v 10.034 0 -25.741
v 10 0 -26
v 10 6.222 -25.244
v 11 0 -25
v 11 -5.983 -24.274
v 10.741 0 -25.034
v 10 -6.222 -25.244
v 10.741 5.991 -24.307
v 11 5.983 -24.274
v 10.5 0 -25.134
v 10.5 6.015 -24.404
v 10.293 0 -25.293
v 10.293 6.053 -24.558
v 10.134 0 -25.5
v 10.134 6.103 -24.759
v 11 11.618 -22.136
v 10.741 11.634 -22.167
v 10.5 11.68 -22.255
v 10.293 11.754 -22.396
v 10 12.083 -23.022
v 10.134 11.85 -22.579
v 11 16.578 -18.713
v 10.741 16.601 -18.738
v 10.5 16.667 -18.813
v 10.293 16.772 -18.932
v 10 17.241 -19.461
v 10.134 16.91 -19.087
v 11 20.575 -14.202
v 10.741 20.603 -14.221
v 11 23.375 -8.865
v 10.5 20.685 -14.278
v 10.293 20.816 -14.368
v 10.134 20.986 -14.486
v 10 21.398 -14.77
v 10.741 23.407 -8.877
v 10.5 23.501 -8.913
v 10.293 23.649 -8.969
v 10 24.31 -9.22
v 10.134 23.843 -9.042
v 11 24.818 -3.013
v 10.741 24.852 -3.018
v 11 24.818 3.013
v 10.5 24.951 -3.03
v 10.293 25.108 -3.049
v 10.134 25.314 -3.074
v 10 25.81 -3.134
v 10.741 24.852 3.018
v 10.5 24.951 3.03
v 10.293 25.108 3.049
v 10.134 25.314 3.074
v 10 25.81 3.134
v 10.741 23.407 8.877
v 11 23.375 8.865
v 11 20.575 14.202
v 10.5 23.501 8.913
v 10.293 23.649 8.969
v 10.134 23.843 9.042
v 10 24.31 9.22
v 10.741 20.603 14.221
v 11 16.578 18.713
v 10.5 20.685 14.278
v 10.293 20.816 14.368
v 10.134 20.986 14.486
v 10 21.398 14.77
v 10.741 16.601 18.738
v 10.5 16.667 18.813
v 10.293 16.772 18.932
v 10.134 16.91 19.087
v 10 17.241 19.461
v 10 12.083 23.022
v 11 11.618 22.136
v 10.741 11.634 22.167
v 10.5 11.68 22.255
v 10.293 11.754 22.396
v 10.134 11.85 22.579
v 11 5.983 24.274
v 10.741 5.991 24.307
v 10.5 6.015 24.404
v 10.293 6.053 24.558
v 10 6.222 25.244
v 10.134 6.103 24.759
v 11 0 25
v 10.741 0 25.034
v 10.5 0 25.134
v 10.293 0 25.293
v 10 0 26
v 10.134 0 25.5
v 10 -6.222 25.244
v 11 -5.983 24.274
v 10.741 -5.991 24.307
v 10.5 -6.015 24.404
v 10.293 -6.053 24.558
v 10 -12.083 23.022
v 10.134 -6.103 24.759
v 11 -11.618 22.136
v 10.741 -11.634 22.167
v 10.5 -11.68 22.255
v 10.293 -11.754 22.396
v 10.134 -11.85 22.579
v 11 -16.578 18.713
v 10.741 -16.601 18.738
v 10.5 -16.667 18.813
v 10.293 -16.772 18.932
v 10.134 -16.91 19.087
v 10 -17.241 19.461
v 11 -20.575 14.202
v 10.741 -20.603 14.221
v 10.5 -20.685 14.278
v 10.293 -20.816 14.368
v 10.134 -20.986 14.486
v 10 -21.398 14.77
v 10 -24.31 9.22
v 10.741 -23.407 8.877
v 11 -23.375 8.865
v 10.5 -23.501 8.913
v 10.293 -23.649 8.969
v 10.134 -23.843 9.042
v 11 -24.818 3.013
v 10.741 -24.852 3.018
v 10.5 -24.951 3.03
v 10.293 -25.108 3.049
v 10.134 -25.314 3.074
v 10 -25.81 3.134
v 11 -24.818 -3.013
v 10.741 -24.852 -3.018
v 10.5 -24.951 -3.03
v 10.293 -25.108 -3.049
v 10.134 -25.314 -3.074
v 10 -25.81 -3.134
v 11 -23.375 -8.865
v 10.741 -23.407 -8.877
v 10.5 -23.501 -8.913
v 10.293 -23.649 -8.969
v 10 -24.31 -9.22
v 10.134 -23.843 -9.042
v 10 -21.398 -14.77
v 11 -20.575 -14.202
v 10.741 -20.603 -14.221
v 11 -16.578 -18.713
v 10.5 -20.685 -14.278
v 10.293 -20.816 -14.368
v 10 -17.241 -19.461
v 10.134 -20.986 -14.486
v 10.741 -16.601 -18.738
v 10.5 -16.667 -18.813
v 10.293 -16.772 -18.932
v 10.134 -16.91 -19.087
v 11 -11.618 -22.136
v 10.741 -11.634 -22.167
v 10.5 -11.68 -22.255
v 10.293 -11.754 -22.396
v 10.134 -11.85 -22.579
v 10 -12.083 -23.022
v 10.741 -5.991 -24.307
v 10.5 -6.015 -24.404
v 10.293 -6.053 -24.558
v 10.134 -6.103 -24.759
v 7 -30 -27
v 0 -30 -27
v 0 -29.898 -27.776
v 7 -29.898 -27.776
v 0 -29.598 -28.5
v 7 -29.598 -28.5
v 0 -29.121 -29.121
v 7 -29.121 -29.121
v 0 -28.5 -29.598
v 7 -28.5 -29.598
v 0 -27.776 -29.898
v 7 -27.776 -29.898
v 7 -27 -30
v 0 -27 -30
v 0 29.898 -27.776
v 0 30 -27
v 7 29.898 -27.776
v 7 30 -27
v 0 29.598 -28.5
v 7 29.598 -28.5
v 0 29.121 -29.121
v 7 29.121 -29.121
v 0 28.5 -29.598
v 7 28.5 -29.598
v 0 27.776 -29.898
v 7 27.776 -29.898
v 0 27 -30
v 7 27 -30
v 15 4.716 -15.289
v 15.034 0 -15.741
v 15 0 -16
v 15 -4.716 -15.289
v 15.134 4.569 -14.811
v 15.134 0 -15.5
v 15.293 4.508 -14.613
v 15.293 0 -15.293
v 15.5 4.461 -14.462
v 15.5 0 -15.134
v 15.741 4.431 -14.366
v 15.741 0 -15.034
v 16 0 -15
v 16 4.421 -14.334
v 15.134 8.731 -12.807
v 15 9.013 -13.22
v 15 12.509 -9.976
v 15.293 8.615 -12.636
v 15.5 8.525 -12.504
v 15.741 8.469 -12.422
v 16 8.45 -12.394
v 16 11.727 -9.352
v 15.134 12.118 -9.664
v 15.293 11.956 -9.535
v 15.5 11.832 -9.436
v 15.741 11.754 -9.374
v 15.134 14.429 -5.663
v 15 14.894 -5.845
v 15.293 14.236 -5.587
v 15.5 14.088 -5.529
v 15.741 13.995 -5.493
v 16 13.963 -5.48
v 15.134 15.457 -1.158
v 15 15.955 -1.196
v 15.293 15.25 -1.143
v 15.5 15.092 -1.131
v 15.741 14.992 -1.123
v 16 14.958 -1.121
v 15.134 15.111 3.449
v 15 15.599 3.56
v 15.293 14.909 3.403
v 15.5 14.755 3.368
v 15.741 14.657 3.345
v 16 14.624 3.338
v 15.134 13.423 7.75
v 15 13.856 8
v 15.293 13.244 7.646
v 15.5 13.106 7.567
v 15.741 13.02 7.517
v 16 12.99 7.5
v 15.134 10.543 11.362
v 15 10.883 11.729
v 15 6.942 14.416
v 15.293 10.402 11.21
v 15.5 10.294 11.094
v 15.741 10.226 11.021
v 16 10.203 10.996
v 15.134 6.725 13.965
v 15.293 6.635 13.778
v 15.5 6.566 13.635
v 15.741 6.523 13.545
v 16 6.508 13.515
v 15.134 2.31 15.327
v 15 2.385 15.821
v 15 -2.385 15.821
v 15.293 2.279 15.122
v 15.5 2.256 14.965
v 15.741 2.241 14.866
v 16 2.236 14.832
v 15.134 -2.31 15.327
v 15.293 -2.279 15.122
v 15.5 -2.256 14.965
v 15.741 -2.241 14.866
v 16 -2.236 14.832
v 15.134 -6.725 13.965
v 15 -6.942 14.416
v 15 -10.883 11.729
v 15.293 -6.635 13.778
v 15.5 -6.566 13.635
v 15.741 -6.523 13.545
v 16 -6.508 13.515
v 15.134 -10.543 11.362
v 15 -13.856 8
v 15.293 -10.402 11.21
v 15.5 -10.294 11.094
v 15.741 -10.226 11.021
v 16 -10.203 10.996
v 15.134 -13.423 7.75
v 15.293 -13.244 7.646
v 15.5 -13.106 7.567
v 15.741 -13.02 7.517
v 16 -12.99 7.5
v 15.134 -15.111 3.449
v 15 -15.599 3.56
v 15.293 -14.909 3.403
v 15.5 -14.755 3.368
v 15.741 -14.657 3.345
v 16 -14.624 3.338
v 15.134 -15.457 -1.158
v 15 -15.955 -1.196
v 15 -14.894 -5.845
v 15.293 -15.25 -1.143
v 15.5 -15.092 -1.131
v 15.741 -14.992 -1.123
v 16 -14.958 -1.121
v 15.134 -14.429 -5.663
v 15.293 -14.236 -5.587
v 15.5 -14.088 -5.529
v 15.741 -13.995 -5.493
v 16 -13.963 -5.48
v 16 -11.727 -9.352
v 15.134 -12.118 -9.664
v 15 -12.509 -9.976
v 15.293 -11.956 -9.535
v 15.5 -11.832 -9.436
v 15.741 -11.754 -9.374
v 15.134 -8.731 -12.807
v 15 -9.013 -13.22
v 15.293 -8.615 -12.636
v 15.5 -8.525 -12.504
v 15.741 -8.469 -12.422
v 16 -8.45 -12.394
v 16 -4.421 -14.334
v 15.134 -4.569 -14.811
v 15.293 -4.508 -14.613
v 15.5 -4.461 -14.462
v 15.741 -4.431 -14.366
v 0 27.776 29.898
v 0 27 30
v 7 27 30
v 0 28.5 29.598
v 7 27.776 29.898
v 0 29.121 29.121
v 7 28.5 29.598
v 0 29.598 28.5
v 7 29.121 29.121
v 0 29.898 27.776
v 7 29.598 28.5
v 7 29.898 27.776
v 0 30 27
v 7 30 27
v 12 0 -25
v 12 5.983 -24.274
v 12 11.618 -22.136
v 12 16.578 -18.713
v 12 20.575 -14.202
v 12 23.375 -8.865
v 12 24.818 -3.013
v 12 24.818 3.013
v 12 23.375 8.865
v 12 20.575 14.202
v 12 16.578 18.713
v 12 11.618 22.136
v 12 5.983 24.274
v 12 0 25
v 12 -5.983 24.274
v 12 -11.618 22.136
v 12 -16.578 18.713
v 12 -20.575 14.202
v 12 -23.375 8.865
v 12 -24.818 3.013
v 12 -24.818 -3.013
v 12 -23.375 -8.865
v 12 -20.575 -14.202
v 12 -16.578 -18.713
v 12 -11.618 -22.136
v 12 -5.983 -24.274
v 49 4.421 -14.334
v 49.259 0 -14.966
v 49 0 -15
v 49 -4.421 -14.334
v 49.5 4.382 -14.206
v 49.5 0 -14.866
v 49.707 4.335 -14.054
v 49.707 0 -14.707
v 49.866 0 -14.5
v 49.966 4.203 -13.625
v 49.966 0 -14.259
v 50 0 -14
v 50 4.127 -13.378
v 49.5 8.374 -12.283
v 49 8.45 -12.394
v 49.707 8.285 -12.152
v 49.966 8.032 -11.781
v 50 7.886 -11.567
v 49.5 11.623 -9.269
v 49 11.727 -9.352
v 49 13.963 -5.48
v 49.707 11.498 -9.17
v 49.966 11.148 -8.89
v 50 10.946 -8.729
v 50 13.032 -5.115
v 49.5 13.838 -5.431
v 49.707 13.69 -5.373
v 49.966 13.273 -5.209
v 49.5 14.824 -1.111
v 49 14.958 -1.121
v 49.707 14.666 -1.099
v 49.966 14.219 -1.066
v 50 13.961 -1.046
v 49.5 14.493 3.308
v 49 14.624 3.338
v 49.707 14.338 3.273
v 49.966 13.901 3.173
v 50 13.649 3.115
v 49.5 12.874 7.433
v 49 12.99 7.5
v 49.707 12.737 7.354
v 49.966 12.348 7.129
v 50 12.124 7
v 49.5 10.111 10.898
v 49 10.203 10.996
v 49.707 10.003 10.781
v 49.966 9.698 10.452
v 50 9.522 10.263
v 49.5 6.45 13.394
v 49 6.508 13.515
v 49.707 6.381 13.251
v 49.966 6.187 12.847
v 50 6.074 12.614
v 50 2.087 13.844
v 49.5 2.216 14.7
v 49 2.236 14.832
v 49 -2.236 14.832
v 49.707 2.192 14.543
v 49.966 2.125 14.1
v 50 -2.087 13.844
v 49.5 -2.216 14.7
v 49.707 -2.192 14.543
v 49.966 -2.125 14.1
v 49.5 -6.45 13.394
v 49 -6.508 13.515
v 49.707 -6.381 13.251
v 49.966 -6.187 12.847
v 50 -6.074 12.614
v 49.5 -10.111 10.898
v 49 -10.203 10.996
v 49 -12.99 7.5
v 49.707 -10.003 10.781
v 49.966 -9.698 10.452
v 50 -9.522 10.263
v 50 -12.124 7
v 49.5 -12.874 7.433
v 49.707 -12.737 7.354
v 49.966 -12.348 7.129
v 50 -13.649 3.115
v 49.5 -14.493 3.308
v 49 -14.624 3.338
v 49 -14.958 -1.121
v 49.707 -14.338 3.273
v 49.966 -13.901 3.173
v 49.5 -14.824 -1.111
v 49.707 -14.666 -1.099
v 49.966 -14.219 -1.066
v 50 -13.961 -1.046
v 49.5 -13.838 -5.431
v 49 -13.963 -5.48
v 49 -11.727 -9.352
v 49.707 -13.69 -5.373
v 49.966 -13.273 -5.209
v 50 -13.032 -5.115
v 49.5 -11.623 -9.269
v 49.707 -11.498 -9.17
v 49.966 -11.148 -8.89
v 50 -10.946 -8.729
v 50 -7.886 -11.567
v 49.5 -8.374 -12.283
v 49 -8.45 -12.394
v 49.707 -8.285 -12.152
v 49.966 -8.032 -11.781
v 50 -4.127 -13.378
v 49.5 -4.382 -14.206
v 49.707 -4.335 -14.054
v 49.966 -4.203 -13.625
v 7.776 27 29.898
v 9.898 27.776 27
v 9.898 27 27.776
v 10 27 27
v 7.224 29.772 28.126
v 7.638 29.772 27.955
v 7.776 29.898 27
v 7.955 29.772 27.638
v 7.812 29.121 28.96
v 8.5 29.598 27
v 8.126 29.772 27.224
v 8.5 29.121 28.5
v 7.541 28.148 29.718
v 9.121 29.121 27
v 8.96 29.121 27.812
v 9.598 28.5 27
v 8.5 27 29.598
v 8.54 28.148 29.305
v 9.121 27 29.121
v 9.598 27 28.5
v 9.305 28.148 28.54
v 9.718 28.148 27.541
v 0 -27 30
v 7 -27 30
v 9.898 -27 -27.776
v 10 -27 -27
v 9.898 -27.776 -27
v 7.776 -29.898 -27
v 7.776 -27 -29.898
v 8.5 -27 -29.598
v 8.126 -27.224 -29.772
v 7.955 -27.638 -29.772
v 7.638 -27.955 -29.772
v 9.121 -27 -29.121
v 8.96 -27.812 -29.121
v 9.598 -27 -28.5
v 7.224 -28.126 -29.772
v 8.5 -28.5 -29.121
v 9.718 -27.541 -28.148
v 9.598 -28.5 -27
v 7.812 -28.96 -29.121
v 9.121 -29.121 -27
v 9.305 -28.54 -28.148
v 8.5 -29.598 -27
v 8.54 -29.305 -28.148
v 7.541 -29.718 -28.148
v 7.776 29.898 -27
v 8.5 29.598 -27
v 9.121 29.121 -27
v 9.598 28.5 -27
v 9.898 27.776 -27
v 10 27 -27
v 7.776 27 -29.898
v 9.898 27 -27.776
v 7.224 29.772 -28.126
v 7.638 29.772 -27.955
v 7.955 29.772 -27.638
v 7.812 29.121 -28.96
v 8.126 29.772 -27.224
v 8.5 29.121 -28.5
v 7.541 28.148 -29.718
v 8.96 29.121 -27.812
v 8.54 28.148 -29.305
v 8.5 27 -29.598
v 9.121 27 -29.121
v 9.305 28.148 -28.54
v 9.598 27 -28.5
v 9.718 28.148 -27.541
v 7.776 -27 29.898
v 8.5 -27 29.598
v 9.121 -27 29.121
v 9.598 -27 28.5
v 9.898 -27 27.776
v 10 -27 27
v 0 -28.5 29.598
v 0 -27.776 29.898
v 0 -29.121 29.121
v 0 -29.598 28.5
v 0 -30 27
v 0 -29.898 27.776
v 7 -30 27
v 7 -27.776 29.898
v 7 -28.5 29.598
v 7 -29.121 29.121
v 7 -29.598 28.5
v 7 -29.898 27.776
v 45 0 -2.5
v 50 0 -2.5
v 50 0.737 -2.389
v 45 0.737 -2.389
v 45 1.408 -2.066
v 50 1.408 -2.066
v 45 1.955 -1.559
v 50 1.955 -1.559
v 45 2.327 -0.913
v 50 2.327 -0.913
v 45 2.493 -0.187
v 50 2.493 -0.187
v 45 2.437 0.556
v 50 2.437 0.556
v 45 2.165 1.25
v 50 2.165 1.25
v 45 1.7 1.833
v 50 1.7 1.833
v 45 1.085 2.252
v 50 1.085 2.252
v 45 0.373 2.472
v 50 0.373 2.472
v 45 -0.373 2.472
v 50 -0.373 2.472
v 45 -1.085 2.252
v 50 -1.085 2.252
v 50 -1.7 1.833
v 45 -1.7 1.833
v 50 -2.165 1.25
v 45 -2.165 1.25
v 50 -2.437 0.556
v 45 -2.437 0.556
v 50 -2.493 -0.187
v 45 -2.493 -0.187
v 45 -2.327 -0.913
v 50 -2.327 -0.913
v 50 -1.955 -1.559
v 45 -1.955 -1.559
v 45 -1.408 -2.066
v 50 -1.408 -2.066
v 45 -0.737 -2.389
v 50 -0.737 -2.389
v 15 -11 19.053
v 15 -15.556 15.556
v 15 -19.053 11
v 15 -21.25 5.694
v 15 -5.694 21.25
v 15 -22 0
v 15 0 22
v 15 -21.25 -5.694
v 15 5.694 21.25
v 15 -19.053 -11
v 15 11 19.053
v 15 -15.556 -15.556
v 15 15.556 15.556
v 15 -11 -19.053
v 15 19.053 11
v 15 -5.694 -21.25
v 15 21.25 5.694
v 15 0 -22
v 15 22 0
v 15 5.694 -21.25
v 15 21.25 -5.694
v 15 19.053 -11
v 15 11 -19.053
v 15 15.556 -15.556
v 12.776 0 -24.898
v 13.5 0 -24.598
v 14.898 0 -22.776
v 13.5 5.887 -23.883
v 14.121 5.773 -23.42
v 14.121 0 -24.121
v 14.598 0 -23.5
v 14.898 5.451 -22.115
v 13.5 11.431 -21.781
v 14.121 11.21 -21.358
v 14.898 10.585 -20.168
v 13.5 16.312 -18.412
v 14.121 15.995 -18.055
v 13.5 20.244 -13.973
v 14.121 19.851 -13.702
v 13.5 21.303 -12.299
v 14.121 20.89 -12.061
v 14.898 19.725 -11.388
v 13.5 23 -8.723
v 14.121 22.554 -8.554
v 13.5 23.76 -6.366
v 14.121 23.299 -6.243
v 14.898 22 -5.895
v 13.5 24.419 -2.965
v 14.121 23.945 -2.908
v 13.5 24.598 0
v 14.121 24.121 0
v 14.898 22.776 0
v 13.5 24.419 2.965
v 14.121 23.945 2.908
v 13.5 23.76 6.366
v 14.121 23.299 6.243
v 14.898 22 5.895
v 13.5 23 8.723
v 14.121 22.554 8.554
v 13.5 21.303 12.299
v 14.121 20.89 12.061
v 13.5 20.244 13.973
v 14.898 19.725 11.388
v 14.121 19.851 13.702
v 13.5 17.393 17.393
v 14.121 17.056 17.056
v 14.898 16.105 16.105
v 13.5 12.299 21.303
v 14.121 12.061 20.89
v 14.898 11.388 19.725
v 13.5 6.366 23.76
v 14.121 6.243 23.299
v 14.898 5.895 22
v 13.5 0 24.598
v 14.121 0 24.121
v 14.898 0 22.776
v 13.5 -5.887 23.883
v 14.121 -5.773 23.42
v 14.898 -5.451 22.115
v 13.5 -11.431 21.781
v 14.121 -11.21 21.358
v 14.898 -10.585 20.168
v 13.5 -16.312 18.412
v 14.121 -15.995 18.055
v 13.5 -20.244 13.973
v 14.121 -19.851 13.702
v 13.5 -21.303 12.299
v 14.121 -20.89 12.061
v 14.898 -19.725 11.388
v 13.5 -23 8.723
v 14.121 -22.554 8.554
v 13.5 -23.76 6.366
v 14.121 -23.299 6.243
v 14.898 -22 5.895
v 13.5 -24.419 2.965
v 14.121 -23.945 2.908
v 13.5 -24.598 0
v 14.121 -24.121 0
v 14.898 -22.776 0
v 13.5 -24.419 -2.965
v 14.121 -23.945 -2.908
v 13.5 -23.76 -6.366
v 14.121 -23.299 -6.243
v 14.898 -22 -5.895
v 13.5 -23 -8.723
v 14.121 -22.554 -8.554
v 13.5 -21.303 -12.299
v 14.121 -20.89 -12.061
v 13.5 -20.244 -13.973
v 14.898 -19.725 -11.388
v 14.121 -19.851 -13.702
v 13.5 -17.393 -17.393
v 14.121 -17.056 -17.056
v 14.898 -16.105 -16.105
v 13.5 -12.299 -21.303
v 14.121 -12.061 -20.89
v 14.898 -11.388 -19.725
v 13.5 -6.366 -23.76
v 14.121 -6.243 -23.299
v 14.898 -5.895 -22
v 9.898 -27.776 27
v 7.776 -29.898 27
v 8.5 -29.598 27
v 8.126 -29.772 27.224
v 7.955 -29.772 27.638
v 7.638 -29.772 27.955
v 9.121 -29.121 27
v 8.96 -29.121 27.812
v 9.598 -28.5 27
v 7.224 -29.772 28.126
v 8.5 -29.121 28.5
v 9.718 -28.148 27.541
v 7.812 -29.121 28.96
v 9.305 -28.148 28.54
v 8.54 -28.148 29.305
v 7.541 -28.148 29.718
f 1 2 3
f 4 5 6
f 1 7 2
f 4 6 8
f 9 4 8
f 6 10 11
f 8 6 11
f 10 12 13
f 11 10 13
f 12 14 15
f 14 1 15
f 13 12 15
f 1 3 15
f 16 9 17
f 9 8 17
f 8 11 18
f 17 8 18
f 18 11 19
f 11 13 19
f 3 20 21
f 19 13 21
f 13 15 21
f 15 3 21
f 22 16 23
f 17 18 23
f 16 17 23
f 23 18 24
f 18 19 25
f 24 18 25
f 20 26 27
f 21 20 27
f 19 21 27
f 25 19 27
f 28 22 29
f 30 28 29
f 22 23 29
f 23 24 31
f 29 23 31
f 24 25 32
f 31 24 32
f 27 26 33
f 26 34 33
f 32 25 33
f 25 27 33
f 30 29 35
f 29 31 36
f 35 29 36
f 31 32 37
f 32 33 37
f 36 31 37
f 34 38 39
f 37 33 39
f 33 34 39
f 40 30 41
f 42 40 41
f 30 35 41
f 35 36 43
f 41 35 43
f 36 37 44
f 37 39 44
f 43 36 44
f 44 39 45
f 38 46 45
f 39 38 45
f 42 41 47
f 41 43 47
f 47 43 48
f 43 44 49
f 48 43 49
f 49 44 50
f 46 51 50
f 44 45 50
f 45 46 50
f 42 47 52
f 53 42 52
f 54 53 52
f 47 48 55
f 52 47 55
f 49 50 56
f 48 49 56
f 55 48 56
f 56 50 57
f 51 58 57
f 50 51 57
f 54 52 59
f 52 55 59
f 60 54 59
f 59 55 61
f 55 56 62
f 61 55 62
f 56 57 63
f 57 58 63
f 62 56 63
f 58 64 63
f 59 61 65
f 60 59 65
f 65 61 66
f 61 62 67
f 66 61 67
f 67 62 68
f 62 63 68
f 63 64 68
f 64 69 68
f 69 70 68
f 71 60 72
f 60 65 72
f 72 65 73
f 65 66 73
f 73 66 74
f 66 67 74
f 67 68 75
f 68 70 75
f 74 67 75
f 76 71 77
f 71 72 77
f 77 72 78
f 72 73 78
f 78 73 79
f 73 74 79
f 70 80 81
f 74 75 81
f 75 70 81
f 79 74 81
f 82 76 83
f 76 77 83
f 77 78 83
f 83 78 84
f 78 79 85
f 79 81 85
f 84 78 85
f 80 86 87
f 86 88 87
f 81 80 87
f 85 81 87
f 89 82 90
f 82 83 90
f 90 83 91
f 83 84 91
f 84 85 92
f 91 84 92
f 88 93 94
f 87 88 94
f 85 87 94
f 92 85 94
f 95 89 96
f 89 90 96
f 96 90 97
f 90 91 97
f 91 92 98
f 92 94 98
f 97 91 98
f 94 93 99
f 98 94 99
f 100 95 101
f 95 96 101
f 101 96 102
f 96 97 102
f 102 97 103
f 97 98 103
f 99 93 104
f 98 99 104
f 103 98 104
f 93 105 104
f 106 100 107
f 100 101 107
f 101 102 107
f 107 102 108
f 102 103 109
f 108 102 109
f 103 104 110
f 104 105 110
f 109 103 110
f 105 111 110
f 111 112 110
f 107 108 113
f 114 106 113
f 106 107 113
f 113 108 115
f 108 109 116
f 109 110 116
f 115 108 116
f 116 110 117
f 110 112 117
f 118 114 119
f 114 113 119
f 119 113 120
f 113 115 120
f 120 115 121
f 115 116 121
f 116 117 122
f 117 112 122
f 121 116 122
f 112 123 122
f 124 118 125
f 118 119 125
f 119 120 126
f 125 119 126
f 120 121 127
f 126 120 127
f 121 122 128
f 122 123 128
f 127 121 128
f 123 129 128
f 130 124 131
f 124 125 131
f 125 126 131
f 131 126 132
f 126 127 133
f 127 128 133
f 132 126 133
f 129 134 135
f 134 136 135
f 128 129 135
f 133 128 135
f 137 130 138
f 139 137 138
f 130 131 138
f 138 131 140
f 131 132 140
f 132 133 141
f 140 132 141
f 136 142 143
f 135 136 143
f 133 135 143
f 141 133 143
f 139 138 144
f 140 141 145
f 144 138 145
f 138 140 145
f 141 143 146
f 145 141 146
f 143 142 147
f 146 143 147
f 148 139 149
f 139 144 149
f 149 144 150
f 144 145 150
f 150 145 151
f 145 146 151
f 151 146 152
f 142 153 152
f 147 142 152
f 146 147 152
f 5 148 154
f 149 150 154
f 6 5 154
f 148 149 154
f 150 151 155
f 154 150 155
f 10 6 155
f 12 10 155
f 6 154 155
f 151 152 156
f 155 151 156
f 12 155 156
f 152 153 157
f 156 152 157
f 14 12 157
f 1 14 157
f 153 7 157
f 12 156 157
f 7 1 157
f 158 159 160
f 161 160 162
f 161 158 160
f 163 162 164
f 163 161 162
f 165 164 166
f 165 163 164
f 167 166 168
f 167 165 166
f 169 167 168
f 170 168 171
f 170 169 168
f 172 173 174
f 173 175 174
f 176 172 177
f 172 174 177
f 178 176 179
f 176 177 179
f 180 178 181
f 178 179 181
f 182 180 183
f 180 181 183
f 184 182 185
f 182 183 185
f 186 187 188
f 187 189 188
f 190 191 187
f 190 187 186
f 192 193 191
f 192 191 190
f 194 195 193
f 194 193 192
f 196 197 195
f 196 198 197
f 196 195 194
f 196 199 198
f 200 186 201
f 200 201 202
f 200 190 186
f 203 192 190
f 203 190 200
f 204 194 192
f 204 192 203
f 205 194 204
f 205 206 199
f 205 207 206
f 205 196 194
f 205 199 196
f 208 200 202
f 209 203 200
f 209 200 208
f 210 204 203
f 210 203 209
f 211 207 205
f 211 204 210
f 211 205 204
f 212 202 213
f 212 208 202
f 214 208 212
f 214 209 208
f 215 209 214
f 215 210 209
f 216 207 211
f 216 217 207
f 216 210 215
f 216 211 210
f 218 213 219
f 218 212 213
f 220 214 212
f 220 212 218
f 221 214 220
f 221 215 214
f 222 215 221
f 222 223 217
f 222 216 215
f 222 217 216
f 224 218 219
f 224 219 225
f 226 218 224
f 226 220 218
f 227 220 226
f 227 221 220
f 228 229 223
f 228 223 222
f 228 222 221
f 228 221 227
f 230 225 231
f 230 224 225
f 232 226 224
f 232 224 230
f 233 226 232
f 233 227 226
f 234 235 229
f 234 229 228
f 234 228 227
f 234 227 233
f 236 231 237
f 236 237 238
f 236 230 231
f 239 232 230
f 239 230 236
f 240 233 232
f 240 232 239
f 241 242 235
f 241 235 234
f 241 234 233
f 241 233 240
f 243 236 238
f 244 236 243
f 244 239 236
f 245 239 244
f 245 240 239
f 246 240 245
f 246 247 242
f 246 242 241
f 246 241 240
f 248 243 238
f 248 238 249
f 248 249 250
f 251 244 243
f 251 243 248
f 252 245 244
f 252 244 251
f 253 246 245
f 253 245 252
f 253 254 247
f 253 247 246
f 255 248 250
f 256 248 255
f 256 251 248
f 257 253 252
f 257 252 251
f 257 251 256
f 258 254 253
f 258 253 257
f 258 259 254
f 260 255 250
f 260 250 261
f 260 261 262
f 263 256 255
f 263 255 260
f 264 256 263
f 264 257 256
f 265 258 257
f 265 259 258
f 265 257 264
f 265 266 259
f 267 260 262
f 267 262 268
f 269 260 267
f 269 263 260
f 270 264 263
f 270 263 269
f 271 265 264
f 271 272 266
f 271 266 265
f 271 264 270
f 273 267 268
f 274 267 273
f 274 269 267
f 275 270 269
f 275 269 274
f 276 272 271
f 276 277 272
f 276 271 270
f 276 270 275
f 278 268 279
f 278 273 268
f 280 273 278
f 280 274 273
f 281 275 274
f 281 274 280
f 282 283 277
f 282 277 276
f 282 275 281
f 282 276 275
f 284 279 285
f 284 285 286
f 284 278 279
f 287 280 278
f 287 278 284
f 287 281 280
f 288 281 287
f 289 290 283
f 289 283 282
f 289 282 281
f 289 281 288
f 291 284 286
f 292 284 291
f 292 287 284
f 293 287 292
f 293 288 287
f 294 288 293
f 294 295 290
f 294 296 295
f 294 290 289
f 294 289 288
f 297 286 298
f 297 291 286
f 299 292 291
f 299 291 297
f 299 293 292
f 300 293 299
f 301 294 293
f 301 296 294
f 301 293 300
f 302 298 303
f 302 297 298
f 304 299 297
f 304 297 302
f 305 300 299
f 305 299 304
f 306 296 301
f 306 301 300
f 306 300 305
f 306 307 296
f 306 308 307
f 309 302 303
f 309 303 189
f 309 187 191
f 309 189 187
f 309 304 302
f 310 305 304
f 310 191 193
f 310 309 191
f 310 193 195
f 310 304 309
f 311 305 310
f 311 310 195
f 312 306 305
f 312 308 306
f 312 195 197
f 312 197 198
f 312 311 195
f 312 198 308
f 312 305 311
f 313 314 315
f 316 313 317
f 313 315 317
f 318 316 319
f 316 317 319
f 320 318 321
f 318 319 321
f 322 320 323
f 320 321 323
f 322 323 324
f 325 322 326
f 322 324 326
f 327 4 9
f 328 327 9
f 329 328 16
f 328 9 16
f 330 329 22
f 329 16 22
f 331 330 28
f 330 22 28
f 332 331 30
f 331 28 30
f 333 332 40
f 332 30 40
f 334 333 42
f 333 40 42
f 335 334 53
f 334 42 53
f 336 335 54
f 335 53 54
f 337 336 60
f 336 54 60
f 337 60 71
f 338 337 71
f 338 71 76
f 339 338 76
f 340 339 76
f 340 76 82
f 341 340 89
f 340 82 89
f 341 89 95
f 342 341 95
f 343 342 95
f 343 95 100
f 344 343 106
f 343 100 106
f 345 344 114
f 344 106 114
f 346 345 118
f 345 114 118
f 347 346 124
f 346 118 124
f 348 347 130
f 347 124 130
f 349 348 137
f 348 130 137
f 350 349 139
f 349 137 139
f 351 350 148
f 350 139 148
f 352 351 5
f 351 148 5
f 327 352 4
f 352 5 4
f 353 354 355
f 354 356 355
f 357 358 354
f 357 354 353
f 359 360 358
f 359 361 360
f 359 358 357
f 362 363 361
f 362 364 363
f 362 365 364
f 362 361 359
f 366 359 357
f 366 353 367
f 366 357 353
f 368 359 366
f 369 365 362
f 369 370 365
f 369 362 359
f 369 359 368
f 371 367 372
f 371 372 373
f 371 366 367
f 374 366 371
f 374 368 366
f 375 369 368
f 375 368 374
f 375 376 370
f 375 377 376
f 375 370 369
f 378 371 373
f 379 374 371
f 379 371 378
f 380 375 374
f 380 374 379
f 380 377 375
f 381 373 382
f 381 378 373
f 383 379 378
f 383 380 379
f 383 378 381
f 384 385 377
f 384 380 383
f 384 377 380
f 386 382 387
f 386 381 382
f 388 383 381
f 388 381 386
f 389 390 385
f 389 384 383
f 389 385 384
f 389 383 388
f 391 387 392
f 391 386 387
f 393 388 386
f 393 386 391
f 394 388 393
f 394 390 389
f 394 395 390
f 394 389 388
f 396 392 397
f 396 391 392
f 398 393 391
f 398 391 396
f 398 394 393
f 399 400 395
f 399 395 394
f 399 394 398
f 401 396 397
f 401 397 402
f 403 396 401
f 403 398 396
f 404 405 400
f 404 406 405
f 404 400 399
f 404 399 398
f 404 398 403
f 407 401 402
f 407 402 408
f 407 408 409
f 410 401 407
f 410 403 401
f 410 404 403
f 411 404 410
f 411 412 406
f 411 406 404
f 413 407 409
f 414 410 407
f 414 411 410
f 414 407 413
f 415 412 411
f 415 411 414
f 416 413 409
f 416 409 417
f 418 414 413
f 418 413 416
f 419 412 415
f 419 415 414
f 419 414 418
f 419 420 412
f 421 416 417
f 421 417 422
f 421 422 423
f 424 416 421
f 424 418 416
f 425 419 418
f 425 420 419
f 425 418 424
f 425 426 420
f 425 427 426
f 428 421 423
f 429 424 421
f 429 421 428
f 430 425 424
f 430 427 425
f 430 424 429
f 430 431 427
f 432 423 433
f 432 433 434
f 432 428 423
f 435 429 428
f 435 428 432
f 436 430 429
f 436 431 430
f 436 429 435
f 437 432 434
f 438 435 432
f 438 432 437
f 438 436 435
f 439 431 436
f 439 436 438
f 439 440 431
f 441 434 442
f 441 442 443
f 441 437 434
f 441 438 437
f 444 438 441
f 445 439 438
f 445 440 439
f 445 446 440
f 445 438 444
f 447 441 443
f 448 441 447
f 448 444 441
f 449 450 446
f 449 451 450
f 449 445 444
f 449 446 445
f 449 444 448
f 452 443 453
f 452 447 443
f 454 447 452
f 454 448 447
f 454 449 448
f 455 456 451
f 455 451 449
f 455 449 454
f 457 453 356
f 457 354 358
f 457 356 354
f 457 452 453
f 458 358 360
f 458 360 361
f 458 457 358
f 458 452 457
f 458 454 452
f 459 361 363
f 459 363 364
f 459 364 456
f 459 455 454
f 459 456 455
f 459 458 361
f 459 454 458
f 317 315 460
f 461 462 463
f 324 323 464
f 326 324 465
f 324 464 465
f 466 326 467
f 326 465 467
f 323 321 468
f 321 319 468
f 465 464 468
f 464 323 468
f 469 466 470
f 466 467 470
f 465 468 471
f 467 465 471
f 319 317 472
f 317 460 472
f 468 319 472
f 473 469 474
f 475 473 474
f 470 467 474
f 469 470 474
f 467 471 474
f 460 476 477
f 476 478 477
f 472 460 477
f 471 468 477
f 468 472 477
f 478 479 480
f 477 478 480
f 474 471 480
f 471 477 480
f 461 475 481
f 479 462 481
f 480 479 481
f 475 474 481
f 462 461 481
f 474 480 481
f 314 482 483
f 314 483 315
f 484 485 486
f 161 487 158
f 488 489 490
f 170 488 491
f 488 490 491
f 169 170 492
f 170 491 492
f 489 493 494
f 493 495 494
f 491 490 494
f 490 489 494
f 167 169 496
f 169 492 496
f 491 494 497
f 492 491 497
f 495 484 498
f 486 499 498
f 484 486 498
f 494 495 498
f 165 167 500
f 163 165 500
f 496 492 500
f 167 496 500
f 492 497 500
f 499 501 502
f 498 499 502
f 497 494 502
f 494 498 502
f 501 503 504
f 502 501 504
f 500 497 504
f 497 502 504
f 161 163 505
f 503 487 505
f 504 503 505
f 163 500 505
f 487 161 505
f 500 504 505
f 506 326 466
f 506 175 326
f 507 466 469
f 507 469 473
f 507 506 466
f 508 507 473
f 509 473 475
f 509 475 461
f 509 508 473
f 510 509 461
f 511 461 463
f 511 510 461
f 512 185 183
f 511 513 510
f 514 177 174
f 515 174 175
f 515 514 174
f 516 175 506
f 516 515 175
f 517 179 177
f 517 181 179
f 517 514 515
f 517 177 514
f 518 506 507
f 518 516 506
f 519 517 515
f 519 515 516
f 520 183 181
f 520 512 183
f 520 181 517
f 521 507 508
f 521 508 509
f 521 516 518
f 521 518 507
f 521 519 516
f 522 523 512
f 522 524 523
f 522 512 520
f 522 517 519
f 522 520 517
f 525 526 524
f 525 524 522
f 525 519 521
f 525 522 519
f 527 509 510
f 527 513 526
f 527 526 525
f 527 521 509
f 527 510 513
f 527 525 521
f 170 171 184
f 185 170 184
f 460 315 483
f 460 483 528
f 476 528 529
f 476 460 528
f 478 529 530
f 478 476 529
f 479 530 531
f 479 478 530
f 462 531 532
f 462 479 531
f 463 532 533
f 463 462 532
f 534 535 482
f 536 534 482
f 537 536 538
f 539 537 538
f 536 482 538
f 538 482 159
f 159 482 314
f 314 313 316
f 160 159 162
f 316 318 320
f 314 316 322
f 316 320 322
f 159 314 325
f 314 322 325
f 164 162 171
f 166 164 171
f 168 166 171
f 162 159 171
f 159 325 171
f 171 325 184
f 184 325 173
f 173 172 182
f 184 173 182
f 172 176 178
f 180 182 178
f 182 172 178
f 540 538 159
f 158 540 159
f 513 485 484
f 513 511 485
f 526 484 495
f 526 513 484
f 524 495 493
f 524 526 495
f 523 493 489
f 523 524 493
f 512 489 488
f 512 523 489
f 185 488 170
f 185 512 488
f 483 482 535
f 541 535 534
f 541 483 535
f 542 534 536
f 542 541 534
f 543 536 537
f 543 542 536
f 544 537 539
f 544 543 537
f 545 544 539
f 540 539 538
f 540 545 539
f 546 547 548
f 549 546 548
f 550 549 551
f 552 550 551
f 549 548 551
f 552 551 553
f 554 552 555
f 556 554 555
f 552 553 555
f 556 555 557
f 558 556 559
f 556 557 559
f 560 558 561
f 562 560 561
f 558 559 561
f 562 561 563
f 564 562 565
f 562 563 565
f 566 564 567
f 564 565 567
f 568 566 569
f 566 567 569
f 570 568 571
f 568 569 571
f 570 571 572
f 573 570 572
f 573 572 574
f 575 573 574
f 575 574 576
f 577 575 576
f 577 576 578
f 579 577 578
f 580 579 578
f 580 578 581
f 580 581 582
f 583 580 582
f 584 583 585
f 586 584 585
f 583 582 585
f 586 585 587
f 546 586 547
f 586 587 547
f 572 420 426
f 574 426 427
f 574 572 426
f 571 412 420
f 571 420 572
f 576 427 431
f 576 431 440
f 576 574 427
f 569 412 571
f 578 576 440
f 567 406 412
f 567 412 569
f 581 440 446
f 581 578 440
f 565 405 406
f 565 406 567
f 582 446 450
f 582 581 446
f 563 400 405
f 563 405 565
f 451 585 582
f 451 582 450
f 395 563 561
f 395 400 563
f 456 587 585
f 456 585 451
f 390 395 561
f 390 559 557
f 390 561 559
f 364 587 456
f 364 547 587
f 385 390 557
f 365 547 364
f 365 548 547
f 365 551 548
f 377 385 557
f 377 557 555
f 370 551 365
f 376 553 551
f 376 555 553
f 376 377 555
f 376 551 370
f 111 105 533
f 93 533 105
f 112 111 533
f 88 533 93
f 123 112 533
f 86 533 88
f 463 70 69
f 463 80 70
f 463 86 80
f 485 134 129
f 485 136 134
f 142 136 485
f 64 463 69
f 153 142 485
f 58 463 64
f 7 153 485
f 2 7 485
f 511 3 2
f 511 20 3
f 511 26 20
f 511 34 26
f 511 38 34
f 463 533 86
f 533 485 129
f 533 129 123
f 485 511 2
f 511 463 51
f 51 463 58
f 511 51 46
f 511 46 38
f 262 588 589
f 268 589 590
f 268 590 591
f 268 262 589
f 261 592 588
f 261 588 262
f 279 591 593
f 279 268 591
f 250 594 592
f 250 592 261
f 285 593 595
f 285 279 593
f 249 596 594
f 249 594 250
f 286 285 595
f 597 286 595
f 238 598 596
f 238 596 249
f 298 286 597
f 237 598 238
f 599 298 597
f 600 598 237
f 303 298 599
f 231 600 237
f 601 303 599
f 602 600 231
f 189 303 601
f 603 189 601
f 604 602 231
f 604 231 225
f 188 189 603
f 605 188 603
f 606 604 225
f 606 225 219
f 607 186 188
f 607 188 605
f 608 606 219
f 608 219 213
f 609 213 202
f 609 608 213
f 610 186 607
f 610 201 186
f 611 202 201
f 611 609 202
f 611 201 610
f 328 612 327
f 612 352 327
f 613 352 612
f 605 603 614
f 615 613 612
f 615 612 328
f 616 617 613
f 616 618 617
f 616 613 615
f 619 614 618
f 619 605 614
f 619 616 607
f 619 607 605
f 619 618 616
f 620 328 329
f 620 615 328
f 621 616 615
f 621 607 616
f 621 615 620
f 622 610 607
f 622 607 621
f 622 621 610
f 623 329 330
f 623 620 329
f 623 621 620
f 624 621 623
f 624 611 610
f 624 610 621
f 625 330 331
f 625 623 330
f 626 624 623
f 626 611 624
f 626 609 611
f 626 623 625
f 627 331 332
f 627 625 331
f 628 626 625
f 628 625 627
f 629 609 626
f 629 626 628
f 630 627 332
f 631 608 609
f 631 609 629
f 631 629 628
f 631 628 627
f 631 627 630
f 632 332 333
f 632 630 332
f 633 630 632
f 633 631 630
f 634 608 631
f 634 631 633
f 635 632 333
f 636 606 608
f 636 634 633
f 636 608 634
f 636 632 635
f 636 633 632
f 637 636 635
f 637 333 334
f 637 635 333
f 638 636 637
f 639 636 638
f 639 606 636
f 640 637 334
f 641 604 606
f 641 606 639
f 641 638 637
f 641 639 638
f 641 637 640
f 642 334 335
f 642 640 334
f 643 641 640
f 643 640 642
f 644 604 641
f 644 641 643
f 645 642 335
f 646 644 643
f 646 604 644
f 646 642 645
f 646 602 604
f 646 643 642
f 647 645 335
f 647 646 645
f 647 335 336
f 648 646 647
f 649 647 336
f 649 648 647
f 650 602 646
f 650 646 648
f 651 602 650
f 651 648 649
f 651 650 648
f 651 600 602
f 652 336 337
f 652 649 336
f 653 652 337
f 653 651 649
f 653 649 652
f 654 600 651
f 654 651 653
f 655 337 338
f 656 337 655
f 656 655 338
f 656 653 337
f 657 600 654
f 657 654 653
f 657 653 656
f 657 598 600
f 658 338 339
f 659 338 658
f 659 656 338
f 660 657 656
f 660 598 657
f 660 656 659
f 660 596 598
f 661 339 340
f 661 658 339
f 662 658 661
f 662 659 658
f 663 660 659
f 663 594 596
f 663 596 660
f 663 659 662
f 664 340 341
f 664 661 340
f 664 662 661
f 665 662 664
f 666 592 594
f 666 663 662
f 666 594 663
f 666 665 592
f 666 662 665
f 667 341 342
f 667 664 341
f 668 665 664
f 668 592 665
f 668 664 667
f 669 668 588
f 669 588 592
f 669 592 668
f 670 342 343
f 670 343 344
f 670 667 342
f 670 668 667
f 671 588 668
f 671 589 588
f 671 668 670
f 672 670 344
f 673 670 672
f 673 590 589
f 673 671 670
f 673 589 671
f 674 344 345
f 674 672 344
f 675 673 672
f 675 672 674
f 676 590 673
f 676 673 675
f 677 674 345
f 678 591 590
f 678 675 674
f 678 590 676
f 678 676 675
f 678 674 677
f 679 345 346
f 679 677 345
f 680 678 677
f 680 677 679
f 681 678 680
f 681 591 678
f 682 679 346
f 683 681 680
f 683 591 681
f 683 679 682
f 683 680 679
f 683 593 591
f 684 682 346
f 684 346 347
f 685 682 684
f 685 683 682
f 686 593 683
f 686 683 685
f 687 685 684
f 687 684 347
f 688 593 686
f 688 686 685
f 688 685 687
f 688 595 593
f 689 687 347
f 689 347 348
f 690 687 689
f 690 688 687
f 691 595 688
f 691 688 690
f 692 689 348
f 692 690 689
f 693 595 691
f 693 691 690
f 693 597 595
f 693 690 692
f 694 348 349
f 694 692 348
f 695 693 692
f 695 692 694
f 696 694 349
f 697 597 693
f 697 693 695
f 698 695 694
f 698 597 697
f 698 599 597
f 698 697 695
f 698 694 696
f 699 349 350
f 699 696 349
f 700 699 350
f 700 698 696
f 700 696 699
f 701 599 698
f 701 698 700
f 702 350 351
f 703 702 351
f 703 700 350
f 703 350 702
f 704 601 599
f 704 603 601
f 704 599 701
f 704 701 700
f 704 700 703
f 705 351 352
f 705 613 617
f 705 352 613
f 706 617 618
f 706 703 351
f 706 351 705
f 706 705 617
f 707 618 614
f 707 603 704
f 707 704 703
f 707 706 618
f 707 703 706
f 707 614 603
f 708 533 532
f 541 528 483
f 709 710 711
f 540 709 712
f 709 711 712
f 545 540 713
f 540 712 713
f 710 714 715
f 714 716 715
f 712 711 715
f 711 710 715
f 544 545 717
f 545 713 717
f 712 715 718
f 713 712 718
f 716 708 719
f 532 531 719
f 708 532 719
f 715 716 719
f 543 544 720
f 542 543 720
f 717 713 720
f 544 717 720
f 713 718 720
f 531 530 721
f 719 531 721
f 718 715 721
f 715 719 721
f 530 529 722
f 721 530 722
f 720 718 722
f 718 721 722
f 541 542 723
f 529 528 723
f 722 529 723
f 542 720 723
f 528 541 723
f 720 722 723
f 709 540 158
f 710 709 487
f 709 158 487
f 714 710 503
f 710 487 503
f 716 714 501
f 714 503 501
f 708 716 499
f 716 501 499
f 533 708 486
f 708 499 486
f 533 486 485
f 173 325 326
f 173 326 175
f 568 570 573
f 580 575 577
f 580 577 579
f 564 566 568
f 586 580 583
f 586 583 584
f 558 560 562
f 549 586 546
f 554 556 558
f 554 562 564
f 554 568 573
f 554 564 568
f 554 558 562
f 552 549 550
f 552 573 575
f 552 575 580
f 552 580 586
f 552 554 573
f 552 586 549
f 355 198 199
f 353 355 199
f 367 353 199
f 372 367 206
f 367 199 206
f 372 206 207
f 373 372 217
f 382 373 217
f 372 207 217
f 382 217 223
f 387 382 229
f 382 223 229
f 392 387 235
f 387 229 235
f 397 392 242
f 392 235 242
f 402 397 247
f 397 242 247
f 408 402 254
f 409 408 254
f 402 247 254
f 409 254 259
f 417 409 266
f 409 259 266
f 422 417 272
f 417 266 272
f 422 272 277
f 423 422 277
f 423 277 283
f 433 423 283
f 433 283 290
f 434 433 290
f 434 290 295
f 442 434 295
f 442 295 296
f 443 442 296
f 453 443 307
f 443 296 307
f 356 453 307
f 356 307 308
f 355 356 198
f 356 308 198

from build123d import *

# Parameters (mm, degrees)
SKETCH1_W           = 60
SKETCH1_H           = 60
BOSS_EXTRUDE1_DEPTH = 10
SKETCH2_R           = 25
BOSS_EXTRUDE2_DEPTH = 5
SKETCH3_R           = 15
BOSS_EXTRUDE3_DEPTH = 35
SKETCH4_R           = 2.5
CUT_EXTRUDE1_DEPTH  = 5
FILLET1_R           = 3
FILLET2_R           = 3
FILLET3_R           = 1


with BuildPart() as part:
    # Sketch1 → Boss-Extrude1 (new body)
    with BuildSketch(Plane(origin=(0, 0, 0), x_dir=(0, 0, -1), z_dir=(1, 0, 0))):
        Rectangle(SKETCH1_W, SKETCH1_H)
    extrude(amount=BOSS_EXTRUDE1_DEPTH)

    # Sketch2 → Boss-Extrude2 (add)
    with BuildSketch(Plane(origin=(10, 0, 0), x_dir=(0, 0, -1), z_dir=(1, 0, 0))):
        Circle(SKETCH2_R)
    extrude(amount=BOSS_EXTRUDE2_DEPTH)

    # Sketch3 → Boss-Extrude3 (add)
    with BuildSketch(Plane(origin=(15, 0, 0), x_dir=(0, 0, -1), z_dir=(1, 0, 0))):
        Circle(SKETCH3_R)
    extrude(amount=BOSS_EXTRUDE3_DEPTH)

    # Sketch4 → Cut-Extrude1 (cut)
    with BuildSketch(Plane(origin=(50, 0, 0), x_dir=(0, 0, -1), z_dir=(1, 0, 0))):
        Circle(SKETCH4_R)
    extrude(amount=-CUT_EXTRUDE1_DEPTH, mode=Mode.SUBTRACT)

    # Fillet1
    fillet1_edges = [part.edges().sort_by_distance(p)[0] for p in [
        (10, 0, 30),
        (10, -30, 0),
        (10, 0, -30),
        (5, -30, -30),
        (5, -30, 30),
        (5, 30, 30),
        (5, 30, -30),
        (10, 30, 0),
    ]]
    fillet(fillet1_edges, radius=FILLET1_R)

    # Fillet2
    fillet2_edges = [part.edges().sort_by_distance(p)[0] for p in [
        (15, 0, 25),
    ]]
    fillet(fillet2_edges, radius=FILLET2_R)

    # Fillet3
    fillet3_edges = [part.edges().sort_by_distance(p)[0] for p in [
        (10, 0, 25),
        (15, 0, 15),
        (50, 0, 15),
    ]]
    fillet(fillet3_edges, radius=FILLET3_R)


solid = part.part
